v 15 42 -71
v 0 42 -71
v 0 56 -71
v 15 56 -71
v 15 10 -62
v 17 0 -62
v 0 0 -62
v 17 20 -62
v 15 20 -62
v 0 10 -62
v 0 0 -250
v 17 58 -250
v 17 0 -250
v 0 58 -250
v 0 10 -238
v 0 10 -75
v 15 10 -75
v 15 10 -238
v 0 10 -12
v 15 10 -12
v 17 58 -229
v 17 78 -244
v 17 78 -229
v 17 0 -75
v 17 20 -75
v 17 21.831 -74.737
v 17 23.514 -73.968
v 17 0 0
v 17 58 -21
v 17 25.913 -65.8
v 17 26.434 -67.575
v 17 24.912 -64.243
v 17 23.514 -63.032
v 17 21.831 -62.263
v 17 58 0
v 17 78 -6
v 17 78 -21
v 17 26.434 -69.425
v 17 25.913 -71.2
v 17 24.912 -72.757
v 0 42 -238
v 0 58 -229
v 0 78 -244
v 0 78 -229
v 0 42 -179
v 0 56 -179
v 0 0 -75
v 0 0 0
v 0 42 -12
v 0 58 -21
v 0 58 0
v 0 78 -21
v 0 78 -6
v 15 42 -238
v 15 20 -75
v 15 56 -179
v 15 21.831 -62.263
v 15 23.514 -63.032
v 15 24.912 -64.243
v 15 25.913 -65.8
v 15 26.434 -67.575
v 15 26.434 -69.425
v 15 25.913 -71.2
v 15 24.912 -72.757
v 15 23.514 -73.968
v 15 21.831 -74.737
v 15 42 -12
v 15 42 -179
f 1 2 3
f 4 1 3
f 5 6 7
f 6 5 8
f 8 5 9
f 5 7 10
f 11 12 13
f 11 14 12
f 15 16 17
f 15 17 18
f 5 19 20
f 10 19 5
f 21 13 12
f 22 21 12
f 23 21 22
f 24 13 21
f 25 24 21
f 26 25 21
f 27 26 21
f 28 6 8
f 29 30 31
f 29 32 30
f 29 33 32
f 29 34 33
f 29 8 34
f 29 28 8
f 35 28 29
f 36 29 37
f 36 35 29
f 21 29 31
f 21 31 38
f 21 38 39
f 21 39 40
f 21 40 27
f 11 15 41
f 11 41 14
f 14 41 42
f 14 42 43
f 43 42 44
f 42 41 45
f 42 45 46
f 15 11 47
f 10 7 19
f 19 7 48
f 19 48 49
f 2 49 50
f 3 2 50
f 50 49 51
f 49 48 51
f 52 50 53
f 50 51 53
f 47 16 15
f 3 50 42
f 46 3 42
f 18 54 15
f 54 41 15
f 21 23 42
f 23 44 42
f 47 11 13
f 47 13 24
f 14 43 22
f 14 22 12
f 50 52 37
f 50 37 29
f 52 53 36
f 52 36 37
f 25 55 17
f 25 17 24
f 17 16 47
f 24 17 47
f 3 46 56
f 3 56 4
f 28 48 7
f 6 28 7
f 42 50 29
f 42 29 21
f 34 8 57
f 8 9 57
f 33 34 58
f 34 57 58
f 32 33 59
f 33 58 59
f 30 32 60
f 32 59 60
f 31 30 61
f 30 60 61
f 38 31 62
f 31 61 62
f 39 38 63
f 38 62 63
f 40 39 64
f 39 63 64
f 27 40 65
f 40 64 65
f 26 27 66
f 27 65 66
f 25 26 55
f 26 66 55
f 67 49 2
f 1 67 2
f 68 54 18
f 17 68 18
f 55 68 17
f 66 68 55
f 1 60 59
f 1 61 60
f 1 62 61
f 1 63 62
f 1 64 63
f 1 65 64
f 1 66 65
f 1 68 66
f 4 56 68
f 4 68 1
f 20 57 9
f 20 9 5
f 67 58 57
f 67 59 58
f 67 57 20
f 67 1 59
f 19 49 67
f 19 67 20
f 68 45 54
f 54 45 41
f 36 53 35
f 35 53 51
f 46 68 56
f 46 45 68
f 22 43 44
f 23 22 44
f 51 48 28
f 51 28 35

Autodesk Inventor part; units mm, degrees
ref_plane "YZ Plane" through (0, 0, 0) normal (1, 0, 0) x (0, 1, 0)
ref_plane "XZ Plane" through (0, 0, 0) normal (0, 1, 0) x (-1, 0, 0)
ref_plane "XY Plane" through (0, 0, 0) normal (0, 0, 1) x (1, 0, 0)
sketch "Sketch1" plane through (0, 0, 0) normal (1, 0, 0) x (0, 1, 0)
  line L0 (0, 0) -> (58, 0)
  line L1 (58, -250) -> (0, -250)
  line L2 (78, -6) -> (78, -21)
  line L3 (78, -21) -> (58, -21)
  line L4 (58, -21) -> (58, -125)
  line L5 (78, -21) -> (78, -6)
  line L6 (78, -21) -> (78, -6)
  line L7 (78, -229) -> (58, -229)
  line L8 (58, -229) -> (58, -125)
  line L9 (78, -244) -> (58, -250)
  line L10 (78, -244) -> (78, -229)
  line L11 (0, 0) -> (0, -62)
  line L12 (0, -62) -> (20, -62)
  line L13 (20, -75) -> (0, -75)
  arc A0 (20, -75) -> (20, -62) centre (20, -68.5) ccw
  line L14 (78, -6) -> (78, -21)
  line L15 (78, -229) -> (78, -244)
  line L16 (0, -250) -> (0, -75)
  line L17 (0, -62) -> (0, 0)
  line L18 (58, 0) -> (0, 0)
  line L19 (0, 0) -> (0, -62)
  line L20 (0, -62) -> (20, -62)
  arc A1 (20, -75) -> (20, -62) centre (20, -68.5) ccw
  line L21 (20, -75) -> (0, -75)
  line L22 (0, -75) -> (0, -250)
  line L23 (0, -250) -> (58, -250)
  line L24 (58, 0) -> (0, 0)
  line L25 (78, -6) -> (58, 0)
  dimension "d8" = 62
  dimension "d10" = 13
  dimension "d21" = 15
  dimension "d22" = 15
extrude "Extrusion2" add sketch "Sketch1" along normal blind 17
sketch "Sketch2" plane through (0, 0, 0) normal (-1, 0, 0) x (0, 0, 1)
  line L0 (-75, 0) -> (-250, 0) projected
  line L1 (-229, 42) -> (-238, 42)
  line L2 (-238, 42) -> (-238, 10)
  line L3 (-75, 0) -> (-250, 0) projected
  line L4 (-229, 42) -> (-179, 42)
  line L5 (-179, 42) -> (-179, 56)
  line L6 (-238, 10) -> (-125, 10)
  line L7 (-21, 42) -> (-12, 42)
  line L8 (-12, 42) -> (-12, 10)
  line L9 (-21, 42) -> (-71, 42)
  line L10 (-71, 42) -> (-71, 56)
  line L11 (-12, 10) -> (-125, 10)
  line L12 (-179, 56) -> (-71, 56)
  point P0 (-229, 58)
  dimension "d14" = 16
  dimension "d15" = 9
  dimension "d23" = 32
extrude "Extrusion3" cut sketch "Sketch2" against normal blind 15
properties part number "Right Side" material "Steel"
